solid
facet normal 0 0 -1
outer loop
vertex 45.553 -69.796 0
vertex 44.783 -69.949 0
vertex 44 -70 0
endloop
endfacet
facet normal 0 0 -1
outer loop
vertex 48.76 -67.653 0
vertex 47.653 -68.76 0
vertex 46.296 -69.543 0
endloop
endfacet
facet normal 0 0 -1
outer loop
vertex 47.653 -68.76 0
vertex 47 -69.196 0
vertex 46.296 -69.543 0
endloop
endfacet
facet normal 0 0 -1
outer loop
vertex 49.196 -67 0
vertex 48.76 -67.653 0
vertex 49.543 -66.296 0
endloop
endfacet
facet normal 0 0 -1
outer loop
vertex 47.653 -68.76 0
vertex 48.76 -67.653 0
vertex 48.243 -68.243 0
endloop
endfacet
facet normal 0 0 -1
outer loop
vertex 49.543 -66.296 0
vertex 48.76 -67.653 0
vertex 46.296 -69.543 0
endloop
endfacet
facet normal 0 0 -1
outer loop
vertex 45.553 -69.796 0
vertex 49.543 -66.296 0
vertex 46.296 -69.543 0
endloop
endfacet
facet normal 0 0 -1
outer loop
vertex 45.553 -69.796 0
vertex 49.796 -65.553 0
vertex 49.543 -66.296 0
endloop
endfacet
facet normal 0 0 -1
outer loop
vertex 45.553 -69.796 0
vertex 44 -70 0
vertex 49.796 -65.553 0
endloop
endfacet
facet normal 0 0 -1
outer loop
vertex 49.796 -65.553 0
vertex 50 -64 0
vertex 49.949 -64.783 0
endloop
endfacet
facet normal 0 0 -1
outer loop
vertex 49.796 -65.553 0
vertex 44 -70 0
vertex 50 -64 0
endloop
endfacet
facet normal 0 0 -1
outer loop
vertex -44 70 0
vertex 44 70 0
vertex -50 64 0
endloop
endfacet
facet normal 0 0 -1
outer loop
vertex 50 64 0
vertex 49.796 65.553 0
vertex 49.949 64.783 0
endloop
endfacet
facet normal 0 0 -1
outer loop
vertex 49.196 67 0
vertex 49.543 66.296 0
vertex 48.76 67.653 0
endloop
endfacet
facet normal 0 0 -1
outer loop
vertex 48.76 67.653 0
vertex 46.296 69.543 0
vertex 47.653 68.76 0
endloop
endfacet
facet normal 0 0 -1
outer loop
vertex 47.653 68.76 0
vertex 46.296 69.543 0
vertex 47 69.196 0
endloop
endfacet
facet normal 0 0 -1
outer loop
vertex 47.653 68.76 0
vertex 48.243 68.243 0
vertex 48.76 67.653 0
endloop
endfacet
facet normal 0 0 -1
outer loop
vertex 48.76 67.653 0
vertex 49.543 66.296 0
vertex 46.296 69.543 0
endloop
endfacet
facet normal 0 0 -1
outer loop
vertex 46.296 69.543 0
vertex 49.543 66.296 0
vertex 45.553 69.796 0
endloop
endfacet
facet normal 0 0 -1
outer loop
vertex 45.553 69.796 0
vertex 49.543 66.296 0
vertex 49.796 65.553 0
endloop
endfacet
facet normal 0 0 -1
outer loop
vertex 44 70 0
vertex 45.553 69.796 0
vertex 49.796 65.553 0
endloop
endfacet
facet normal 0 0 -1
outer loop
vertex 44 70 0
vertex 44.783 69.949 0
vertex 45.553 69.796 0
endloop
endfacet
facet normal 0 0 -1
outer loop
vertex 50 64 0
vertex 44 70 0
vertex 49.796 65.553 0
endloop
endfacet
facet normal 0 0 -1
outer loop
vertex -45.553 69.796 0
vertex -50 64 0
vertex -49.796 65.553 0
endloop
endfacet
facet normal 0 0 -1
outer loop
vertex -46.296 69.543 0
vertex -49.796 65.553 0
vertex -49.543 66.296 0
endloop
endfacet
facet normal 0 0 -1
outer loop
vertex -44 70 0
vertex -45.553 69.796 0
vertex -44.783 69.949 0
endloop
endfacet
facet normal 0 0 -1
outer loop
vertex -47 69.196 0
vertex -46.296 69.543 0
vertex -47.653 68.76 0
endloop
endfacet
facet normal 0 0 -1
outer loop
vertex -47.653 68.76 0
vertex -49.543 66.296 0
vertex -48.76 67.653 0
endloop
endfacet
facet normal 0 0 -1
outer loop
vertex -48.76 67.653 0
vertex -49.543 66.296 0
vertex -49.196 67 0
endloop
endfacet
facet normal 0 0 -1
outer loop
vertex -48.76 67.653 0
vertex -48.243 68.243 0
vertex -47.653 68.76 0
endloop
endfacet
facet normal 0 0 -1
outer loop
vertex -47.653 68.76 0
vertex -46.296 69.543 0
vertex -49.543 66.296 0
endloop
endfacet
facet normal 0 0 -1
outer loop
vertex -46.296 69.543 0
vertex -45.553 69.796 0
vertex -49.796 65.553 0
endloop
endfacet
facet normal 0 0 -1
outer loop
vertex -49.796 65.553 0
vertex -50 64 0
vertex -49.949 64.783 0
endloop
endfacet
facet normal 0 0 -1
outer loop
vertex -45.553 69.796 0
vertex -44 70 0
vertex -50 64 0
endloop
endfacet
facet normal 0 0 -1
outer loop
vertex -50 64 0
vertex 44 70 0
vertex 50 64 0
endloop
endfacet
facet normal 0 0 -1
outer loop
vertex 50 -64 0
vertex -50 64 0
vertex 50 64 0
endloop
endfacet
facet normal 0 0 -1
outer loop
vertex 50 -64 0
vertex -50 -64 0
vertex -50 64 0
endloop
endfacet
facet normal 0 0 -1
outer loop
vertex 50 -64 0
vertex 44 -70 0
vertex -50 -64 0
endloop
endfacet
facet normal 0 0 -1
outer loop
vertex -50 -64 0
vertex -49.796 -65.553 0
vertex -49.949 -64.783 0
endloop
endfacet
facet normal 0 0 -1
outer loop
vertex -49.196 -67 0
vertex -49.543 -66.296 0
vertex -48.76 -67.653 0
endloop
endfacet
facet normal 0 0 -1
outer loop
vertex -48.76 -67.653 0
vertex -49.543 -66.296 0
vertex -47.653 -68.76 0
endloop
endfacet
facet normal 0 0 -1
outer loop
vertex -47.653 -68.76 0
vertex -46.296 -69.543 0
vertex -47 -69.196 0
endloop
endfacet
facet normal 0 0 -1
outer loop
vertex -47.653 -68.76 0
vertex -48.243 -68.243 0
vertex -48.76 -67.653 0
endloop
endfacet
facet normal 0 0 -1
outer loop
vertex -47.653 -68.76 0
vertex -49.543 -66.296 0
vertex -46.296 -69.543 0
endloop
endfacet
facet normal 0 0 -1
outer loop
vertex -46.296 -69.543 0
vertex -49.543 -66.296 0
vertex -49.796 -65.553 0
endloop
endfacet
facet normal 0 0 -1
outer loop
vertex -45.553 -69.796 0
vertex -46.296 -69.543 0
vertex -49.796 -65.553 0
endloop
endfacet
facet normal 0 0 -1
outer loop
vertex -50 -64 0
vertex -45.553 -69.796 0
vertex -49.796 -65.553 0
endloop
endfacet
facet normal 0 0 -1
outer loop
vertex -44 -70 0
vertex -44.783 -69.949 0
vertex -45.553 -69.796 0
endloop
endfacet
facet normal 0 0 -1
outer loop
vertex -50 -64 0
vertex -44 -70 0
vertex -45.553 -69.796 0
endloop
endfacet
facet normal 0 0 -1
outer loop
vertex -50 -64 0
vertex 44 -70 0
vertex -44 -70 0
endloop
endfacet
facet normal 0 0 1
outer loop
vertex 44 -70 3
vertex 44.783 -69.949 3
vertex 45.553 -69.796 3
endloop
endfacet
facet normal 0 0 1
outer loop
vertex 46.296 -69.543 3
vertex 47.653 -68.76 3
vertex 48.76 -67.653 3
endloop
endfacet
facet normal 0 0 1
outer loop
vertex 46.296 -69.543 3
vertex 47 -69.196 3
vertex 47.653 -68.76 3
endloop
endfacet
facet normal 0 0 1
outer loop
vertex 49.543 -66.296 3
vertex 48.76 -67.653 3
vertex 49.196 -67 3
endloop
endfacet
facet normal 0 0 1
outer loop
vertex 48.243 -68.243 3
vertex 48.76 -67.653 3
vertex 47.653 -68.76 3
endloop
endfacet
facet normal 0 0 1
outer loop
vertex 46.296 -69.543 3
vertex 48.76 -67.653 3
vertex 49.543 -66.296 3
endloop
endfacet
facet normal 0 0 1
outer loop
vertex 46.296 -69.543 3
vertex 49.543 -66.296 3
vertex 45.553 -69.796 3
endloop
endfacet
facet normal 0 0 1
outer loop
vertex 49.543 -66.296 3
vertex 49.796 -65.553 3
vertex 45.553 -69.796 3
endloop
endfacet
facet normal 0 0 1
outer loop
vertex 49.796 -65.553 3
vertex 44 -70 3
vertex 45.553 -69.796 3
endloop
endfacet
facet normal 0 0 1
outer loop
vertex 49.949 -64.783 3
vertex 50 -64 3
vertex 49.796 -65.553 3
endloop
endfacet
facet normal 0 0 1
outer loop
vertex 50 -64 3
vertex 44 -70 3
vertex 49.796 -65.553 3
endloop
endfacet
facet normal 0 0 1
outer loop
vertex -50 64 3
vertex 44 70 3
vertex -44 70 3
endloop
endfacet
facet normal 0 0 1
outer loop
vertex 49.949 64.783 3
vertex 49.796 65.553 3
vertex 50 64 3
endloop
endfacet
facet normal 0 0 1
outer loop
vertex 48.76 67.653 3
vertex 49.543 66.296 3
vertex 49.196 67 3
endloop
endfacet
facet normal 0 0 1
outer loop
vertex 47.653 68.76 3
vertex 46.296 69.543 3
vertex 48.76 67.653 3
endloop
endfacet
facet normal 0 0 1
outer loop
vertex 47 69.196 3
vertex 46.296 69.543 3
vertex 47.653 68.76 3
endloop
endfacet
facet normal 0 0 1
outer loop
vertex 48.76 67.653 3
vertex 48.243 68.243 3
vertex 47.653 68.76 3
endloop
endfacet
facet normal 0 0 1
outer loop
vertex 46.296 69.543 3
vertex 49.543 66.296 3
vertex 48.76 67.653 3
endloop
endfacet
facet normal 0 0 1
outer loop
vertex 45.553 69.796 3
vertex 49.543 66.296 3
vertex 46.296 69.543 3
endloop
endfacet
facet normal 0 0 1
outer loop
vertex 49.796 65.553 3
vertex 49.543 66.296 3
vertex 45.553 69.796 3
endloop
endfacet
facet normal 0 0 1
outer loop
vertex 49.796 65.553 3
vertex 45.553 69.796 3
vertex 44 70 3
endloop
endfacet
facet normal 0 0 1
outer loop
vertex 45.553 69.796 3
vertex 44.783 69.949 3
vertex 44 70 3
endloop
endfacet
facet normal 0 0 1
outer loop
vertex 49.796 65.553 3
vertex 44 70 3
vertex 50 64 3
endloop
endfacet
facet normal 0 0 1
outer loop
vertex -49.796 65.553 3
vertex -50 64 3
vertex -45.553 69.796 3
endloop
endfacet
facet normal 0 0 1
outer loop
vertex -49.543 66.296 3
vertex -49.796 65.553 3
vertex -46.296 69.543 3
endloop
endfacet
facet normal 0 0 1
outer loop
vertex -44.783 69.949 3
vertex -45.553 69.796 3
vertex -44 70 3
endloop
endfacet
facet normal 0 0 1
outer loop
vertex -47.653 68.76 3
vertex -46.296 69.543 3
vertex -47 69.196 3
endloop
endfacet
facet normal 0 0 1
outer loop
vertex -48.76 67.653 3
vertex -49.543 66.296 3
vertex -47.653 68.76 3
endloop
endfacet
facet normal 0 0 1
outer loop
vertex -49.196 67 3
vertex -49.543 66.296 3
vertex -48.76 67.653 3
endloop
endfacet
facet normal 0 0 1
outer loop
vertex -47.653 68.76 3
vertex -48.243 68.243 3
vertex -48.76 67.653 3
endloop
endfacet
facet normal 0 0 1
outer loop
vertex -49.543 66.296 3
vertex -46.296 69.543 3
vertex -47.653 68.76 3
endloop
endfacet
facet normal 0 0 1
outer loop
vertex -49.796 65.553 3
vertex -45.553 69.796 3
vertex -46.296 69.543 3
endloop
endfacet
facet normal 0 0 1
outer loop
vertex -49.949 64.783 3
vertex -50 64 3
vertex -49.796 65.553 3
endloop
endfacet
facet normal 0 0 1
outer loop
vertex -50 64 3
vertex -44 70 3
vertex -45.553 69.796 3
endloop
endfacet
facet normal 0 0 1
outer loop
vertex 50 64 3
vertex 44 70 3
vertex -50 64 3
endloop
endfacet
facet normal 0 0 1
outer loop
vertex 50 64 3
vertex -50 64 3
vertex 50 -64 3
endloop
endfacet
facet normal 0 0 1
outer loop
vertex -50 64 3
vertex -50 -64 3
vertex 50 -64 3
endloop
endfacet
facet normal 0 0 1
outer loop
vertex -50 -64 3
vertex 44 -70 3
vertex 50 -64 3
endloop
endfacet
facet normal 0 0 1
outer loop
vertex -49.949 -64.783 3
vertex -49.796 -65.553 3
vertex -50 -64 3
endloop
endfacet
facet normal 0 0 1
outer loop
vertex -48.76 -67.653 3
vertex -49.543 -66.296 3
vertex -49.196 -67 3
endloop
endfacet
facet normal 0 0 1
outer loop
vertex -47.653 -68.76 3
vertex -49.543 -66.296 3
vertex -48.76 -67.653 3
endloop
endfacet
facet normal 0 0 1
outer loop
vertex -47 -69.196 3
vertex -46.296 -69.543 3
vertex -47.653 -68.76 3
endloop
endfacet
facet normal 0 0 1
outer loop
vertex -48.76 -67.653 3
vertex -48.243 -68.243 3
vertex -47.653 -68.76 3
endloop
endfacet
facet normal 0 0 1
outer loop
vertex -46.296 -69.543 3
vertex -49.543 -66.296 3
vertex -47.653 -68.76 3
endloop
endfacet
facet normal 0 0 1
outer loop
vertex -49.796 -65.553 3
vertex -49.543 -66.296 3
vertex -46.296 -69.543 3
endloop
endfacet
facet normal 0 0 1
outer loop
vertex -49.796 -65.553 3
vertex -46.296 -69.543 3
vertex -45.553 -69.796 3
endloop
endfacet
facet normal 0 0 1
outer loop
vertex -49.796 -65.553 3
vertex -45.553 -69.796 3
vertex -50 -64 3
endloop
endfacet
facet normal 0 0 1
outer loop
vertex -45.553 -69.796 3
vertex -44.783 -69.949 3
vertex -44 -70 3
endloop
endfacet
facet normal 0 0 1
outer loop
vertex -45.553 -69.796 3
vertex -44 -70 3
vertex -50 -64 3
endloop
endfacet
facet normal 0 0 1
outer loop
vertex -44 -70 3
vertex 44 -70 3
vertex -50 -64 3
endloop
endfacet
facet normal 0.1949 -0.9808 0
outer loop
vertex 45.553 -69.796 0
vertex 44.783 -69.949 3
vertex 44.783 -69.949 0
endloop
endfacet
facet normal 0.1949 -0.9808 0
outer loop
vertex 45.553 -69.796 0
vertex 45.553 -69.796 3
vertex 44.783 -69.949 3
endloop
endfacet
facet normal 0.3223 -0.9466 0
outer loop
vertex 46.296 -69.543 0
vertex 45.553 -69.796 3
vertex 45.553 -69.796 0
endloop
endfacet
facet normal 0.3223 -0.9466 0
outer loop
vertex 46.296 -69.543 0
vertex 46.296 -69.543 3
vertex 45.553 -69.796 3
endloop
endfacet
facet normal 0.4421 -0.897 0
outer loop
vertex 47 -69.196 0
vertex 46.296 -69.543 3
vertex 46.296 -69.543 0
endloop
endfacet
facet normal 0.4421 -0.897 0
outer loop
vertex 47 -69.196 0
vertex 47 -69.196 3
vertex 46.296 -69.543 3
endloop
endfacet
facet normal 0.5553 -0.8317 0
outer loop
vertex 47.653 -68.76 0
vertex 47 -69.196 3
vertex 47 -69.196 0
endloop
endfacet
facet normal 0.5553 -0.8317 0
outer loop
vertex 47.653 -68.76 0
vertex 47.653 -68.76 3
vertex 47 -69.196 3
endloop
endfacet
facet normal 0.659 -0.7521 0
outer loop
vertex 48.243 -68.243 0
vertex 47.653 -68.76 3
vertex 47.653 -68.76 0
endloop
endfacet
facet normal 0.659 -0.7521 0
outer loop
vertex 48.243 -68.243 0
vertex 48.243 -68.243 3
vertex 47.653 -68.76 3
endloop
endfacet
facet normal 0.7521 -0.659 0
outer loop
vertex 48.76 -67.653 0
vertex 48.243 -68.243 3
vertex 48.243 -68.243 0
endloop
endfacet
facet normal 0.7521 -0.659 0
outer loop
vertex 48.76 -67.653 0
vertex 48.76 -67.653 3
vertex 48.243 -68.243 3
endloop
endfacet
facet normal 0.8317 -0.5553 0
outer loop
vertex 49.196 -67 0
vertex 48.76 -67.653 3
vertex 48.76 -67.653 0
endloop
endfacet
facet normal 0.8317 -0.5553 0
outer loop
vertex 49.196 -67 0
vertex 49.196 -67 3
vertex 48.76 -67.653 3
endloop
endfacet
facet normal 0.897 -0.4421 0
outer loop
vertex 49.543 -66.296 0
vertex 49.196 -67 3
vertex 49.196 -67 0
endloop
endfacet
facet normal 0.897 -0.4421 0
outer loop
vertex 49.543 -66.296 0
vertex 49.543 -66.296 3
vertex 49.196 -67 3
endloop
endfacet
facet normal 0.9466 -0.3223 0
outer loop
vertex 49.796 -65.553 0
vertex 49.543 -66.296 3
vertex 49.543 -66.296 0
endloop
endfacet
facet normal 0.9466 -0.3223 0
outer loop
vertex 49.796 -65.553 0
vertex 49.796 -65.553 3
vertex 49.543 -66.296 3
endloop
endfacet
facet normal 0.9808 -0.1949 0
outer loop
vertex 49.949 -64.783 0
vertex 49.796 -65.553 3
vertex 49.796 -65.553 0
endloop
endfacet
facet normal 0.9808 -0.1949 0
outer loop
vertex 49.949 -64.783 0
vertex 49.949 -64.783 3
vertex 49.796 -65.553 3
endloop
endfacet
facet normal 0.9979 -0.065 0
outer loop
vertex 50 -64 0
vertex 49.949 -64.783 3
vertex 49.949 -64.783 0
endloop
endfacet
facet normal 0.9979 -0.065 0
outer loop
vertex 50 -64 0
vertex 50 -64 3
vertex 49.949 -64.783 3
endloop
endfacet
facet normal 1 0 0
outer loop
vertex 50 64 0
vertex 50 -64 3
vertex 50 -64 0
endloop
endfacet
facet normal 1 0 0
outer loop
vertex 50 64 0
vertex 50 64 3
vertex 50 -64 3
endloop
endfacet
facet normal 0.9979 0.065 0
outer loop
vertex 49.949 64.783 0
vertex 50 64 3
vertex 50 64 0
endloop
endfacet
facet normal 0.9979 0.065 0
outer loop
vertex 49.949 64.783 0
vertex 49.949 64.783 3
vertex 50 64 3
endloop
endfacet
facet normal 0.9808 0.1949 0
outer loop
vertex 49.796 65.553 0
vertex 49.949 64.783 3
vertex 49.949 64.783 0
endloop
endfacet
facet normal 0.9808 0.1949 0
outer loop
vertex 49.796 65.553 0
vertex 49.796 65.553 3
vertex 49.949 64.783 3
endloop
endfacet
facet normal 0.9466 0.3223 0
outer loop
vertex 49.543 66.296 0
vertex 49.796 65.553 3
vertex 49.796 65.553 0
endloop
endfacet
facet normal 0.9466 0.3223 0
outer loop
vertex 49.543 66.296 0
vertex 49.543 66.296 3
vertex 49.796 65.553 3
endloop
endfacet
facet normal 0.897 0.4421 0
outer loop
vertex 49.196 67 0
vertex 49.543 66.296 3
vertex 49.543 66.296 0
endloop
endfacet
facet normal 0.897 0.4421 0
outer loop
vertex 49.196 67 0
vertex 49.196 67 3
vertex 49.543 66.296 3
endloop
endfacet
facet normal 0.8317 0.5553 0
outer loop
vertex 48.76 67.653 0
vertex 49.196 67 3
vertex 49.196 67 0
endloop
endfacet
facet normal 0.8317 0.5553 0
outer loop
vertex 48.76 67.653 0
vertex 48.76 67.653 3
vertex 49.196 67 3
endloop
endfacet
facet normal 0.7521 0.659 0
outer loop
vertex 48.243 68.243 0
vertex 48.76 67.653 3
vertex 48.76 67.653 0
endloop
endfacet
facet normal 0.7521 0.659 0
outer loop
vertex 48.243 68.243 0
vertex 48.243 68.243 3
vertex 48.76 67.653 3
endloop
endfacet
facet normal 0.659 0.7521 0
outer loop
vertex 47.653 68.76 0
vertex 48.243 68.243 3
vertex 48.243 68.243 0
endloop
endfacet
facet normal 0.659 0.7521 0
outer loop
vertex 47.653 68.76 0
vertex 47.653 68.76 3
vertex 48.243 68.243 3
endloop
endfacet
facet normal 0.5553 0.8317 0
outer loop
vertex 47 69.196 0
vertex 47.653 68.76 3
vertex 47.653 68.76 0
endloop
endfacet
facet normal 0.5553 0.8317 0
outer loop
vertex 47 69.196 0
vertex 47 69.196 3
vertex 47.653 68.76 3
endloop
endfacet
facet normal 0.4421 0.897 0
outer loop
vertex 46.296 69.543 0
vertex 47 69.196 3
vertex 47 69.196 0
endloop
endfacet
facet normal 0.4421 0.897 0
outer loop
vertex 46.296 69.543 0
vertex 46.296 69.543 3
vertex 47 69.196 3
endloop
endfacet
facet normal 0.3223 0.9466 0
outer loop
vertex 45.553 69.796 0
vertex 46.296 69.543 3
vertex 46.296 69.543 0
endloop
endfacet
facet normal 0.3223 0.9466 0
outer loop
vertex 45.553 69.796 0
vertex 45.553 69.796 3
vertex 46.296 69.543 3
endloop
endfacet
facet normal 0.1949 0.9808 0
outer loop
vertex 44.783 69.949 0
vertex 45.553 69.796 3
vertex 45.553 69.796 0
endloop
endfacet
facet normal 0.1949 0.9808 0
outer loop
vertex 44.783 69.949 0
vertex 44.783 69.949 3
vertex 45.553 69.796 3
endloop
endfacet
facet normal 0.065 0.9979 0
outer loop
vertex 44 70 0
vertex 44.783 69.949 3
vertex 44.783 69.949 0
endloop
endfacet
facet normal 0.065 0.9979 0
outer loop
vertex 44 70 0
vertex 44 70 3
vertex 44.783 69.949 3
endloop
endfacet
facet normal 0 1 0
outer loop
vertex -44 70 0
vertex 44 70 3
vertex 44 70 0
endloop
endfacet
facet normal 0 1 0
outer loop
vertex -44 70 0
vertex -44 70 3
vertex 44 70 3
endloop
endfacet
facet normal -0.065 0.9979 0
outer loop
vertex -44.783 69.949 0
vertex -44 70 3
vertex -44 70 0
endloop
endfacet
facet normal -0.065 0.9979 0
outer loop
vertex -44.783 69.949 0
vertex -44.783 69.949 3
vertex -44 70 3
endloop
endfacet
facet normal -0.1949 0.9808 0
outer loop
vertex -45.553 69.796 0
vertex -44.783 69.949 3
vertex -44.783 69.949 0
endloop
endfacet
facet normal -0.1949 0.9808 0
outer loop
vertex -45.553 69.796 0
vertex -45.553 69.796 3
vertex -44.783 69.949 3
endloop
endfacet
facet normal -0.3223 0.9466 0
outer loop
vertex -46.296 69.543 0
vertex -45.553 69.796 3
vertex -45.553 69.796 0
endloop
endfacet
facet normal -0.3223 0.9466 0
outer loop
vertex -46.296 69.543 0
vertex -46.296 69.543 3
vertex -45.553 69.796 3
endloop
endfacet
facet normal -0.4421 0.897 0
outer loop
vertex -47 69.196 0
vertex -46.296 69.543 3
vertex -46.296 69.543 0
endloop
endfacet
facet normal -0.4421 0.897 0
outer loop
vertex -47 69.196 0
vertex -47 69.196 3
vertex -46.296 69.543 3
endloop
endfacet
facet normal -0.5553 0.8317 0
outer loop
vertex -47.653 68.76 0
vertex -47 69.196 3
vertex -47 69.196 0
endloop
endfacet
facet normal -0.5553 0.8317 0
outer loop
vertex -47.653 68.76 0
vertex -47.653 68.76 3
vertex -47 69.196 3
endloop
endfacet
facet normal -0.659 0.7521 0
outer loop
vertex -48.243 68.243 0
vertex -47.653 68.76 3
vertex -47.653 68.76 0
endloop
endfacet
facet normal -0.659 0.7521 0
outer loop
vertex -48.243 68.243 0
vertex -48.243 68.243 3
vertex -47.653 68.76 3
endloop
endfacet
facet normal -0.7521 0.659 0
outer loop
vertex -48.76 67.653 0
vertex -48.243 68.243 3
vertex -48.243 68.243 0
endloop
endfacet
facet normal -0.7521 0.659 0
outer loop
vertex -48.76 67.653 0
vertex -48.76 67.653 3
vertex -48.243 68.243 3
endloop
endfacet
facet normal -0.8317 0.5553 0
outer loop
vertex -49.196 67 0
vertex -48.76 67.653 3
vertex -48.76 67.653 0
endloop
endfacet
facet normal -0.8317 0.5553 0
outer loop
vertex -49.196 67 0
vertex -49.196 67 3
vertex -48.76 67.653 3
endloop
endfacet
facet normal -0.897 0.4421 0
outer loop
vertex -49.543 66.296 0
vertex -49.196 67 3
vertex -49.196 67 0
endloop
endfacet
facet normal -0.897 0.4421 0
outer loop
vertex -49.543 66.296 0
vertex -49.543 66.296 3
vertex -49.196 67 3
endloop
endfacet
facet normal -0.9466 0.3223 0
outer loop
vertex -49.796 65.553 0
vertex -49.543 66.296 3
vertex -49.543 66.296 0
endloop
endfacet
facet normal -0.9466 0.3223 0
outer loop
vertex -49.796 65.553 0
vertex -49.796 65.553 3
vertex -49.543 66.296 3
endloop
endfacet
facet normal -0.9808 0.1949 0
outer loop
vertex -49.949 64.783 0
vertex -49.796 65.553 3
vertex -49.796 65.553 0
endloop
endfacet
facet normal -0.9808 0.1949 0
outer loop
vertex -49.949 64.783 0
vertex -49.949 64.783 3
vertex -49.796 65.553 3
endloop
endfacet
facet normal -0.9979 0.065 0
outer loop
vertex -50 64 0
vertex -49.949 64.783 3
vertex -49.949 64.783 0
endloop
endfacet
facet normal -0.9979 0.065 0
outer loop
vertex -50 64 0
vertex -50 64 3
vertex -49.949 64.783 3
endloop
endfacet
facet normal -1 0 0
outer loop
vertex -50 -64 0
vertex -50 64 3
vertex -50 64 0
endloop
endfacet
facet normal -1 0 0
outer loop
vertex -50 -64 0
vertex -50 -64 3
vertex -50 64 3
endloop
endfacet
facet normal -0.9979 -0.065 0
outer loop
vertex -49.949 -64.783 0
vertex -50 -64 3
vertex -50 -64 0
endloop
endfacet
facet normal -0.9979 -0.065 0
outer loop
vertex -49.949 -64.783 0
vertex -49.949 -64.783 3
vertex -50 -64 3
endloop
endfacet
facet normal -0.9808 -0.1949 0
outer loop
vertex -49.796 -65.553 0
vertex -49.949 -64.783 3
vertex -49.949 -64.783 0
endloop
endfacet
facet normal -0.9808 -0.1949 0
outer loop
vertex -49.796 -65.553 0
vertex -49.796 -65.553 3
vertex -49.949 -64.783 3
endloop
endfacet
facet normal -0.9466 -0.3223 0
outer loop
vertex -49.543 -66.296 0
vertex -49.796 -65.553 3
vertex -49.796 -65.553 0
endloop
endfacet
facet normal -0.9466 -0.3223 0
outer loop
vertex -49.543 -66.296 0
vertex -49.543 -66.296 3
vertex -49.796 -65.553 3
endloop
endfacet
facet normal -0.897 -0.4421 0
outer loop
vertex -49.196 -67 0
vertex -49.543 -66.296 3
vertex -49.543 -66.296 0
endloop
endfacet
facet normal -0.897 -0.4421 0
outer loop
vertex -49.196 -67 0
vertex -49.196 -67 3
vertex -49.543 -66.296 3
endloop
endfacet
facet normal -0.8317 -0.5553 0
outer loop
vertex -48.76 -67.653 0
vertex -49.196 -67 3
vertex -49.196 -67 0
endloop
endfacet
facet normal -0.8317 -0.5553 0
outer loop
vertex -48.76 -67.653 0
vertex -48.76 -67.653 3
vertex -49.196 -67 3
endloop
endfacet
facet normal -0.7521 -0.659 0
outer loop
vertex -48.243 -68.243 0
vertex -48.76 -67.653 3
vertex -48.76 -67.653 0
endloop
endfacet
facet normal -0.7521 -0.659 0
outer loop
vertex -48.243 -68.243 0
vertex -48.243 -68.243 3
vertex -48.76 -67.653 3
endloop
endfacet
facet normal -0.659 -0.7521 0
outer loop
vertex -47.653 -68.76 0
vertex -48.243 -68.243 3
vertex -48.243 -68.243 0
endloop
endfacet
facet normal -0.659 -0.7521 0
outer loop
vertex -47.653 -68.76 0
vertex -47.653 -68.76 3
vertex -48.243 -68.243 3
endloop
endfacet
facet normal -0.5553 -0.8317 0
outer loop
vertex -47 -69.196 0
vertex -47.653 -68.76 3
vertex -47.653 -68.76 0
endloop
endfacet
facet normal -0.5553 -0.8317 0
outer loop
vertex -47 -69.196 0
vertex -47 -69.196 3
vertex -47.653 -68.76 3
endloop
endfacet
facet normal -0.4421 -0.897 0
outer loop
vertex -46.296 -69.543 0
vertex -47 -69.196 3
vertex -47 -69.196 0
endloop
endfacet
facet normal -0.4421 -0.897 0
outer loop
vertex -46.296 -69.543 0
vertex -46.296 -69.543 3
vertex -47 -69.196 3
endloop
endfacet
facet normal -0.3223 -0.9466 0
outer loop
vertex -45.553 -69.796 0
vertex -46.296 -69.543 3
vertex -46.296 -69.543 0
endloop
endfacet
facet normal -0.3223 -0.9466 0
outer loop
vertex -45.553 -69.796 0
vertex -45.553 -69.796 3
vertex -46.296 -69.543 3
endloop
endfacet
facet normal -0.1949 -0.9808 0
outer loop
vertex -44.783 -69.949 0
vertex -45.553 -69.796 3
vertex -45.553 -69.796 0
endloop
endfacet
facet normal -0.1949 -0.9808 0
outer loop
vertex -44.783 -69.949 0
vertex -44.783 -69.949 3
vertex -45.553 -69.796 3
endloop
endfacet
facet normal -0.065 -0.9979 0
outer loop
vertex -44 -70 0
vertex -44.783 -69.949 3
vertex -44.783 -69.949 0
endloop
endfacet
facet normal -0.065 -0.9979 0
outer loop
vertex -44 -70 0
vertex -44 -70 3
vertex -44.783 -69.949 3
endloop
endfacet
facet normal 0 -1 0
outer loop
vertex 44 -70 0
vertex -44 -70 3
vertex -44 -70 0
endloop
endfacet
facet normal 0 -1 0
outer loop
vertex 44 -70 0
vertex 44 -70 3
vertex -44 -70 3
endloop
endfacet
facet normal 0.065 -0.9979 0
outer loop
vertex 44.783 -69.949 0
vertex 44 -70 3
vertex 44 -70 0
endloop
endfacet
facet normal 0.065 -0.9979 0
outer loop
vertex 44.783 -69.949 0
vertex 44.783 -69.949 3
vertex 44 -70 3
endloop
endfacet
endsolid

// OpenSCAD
// Placa "Pague com Pix" com QR Code — modelo próprio do Multiferramenta 3D
// Partes: "placa" (fundo) e "detalhes" (QR, textos — outra cor)
titulo = "PAGUE COM PIX"; chave = "suachave@email.com"; fonte = "Liberation Sans:style=Bold";
largura = 100; altura = 140; esp = 3; relevo = 1; margem = 8; raio = 6;
qr = ["1"];          // linhas do QR Code (vem do criador)
parte = "placa";
$fn = 48;

n = len(qr); lado = largura - 2 * margem; mod = lado / n;
topo_qr = altura / 2 - margem - 18;

module placa() linear_extrude(esp) offset(r = raio) offset(delta = -raio) square([largura, altura], center = true);
module qrcode() translate([-lado / 2, topo_qr - lado]) for (y = [0 : n - 1]) for (x = [0 : n - 1])
  if (qr[y][x] == "1") translate([x * mod, (n - 1 - y) * mod]) square([mod + 0.01, mod + 0.01]);
module textos() {
  translate([0, altura / 2 - margem - 7]) text(titulo, font = fonte, size = 9, halign = "center", valign = "center");
  translate([0, topo_qr - lado - 9]) resize([min(largura - 2 * margem, len(chave) * 4.2), 0], auto = true) text(chave, font = fonte, size = 5, halign = "center", valign = "center");
}
module detalhes() translate([0, 0, esp]) linear_extrude(relevo) { qrcode(); textos(); }

if (parte == "placa") placa();
else if (parte == "detalhes") detalhes();
